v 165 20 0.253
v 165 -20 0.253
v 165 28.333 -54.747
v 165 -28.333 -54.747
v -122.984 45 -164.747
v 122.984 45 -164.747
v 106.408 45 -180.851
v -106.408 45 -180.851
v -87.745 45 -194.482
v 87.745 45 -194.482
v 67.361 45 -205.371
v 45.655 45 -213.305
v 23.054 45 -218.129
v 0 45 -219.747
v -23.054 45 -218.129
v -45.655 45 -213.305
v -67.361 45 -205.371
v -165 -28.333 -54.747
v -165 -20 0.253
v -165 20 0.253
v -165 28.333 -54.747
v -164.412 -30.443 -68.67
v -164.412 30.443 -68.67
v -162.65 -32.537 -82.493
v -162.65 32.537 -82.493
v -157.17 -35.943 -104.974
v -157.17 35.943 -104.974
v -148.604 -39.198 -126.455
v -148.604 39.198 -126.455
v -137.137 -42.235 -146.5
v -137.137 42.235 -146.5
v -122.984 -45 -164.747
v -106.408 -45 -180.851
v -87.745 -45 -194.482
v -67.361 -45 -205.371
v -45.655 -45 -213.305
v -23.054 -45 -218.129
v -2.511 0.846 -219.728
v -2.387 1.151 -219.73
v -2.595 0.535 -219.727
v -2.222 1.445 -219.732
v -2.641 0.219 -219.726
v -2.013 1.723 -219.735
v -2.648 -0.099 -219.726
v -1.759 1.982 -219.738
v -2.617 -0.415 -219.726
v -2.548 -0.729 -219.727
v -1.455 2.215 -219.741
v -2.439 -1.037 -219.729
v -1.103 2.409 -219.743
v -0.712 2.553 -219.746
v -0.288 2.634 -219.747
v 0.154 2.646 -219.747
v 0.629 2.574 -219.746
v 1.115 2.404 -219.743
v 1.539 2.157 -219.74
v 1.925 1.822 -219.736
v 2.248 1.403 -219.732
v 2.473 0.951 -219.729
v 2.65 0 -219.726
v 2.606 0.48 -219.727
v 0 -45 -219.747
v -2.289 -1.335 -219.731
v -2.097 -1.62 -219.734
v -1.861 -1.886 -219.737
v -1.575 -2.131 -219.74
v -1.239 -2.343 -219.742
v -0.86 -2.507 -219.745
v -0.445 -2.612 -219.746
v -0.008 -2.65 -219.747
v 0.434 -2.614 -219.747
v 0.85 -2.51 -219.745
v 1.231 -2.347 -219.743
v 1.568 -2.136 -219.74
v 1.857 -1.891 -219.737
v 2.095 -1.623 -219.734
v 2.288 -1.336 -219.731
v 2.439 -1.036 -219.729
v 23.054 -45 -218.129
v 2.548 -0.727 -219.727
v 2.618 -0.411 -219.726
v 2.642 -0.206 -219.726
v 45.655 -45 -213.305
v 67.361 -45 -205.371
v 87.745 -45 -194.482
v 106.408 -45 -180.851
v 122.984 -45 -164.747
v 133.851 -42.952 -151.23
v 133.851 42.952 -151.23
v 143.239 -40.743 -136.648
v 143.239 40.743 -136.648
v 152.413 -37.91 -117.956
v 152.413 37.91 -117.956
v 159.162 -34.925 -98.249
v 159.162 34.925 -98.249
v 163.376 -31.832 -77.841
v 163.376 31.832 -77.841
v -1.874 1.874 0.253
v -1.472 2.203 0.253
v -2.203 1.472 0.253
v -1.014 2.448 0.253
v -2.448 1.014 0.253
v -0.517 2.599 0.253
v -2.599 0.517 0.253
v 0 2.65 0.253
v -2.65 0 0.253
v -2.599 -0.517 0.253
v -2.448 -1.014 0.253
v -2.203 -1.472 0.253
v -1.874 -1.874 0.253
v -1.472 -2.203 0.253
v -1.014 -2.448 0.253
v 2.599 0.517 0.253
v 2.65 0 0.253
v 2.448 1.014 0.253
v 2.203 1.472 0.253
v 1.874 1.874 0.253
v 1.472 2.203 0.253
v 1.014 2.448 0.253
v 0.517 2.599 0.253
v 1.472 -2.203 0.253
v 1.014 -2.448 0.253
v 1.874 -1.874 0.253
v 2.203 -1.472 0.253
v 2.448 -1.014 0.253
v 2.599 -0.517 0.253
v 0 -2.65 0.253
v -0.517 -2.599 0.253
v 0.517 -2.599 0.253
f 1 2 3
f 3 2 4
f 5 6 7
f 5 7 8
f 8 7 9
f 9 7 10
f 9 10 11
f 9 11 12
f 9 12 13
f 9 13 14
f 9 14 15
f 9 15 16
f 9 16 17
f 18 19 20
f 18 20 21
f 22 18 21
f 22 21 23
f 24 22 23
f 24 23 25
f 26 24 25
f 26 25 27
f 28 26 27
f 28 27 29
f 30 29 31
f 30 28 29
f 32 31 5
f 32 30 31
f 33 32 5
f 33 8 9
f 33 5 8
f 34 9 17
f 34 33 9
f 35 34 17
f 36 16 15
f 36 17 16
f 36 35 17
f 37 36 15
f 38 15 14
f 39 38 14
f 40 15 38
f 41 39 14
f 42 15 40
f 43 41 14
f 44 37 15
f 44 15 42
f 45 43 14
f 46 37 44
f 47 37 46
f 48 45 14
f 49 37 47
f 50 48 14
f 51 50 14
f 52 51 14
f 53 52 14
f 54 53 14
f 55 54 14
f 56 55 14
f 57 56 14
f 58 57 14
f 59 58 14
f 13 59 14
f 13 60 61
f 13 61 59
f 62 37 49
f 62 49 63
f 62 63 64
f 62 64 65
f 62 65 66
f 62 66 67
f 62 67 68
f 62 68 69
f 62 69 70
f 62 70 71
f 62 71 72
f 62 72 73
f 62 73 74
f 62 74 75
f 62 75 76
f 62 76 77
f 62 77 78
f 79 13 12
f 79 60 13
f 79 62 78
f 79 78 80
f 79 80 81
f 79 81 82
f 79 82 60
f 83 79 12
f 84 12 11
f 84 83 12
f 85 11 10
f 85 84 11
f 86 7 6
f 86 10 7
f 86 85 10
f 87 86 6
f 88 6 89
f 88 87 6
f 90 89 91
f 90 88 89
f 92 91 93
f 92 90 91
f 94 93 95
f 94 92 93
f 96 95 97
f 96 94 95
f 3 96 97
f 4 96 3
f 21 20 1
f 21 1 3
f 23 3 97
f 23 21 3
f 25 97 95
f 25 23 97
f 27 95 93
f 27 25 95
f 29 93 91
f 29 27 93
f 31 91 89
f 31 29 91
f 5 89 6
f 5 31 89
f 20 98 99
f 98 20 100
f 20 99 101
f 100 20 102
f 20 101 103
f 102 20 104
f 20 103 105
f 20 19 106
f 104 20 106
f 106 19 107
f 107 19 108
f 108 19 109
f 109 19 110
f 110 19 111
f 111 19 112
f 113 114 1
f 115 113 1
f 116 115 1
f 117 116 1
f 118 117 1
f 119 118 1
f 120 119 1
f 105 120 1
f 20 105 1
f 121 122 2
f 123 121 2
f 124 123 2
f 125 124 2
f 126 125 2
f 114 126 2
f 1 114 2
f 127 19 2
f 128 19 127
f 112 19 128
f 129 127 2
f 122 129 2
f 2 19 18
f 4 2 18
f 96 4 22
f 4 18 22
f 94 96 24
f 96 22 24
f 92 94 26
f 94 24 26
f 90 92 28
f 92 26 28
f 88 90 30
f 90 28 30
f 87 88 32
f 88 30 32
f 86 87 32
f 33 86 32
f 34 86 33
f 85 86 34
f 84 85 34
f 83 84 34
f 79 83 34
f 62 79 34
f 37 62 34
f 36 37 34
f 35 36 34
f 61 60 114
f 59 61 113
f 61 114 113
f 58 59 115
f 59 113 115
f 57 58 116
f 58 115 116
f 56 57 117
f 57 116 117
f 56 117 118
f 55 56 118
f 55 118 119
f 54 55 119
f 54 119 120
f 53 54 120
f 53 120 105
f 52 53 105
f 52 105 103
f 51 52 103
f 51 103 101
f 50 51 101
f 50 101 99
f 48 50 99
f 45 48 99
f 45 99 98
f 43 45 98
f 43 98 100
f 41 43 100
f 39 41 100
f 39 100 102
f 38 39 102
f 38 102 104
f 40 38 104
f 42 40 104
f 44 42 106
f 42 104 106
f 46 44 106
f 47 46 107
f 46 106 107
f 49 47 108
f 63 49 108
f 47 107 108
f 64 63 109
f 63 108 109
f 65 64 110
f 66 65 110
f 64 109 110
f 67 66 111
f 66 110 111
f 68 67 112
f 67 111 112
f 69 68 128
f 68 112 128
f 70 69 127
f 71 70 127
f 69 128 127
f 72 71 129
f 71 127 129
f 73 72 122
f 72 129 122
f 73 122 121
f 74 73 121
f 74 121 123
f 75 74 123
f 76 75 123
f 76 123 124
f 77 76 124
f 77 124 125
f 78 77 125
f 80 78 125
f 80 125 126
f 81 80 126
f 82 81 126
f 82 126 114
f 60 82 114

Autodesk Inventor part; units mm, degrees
ref_plane "YZ Plane" through (0, 0, 0) normal (1, 0, 0) x (0, 1, 0)
ref_plane "XZ Plane" through (0, 0, 0) normal (0, 1, 0) x (-1, 0, 0)
ref_plane "XY Plane" through (0, 0, 0) normal (0, 0, 1) x (1, 0, 0)
sketch "Эскиз1" plane through (0, 0, 0) normal (0, 1, 0) x (-1, 0, 0)
  line L0 (165, 0.2529) -> (-165, 0.2529)
  line L1 (-165, 0.2529) -> (-165, -54.7471)
  line L2 (165, 0.2529) -> (165, -54.7471)
  arc A0 (-165, -54.7471) -> (165, -54.7471) centre (0, -54.7471) ccw
  point P0 (0, 0)
  dimension "d1" = 330
  dimension "d5" = 55
  dimension "d8" = 55
extrude "Выдавливание1" add sketch "Эскиз1" along normal mid plane 90
sketch "Эскиз2" plane through (0, 0, 0) normal (1, 0, 0) x (0, 1, 0)
  line L0 (-45, -54.7471) -> (45, -54.7471) projected
  line L1 (45, 0.2529) -> (45, -54.7471) projected
  line L2 (0, -101.1017) -> (0, -121.0064)
  line L3 (-20, -219.7471) -> (-45, -54.7471)
  line L4 (20, 0.2529) -> (45, -164.7471)
  line L5 (45, 0.2529) -> (20, 0.2529)
  line L6 (45, 0.2529) -> (45, -164.7471)
  line L7 (-45, 0.2529) -> (-45, -54.7471)
  line L8 (-20, 0.2529) -> (-45, -164.7471)
  line L9 (-45, 0.2529) -> (-20, 0.2529)
  line L10 (-45, 0.2529) -> (-45, -164.7471)
  point P0 (0, 0)
extrude "Выдавливание2" cut sketch "Эскиз2" along normal mid plane 330
sketch "Эскиз3" plane through (-165, -20, 0.2529) normal (0, 0, 1) x (1, 0, 0)
  circle A0 centre (165, 20) radius 2.65
  dimension "d14" = 5.3
extrude "Выдавливание3" cut sketch "Эскиз3" against normal up to surface
properties part number "Сыр"
